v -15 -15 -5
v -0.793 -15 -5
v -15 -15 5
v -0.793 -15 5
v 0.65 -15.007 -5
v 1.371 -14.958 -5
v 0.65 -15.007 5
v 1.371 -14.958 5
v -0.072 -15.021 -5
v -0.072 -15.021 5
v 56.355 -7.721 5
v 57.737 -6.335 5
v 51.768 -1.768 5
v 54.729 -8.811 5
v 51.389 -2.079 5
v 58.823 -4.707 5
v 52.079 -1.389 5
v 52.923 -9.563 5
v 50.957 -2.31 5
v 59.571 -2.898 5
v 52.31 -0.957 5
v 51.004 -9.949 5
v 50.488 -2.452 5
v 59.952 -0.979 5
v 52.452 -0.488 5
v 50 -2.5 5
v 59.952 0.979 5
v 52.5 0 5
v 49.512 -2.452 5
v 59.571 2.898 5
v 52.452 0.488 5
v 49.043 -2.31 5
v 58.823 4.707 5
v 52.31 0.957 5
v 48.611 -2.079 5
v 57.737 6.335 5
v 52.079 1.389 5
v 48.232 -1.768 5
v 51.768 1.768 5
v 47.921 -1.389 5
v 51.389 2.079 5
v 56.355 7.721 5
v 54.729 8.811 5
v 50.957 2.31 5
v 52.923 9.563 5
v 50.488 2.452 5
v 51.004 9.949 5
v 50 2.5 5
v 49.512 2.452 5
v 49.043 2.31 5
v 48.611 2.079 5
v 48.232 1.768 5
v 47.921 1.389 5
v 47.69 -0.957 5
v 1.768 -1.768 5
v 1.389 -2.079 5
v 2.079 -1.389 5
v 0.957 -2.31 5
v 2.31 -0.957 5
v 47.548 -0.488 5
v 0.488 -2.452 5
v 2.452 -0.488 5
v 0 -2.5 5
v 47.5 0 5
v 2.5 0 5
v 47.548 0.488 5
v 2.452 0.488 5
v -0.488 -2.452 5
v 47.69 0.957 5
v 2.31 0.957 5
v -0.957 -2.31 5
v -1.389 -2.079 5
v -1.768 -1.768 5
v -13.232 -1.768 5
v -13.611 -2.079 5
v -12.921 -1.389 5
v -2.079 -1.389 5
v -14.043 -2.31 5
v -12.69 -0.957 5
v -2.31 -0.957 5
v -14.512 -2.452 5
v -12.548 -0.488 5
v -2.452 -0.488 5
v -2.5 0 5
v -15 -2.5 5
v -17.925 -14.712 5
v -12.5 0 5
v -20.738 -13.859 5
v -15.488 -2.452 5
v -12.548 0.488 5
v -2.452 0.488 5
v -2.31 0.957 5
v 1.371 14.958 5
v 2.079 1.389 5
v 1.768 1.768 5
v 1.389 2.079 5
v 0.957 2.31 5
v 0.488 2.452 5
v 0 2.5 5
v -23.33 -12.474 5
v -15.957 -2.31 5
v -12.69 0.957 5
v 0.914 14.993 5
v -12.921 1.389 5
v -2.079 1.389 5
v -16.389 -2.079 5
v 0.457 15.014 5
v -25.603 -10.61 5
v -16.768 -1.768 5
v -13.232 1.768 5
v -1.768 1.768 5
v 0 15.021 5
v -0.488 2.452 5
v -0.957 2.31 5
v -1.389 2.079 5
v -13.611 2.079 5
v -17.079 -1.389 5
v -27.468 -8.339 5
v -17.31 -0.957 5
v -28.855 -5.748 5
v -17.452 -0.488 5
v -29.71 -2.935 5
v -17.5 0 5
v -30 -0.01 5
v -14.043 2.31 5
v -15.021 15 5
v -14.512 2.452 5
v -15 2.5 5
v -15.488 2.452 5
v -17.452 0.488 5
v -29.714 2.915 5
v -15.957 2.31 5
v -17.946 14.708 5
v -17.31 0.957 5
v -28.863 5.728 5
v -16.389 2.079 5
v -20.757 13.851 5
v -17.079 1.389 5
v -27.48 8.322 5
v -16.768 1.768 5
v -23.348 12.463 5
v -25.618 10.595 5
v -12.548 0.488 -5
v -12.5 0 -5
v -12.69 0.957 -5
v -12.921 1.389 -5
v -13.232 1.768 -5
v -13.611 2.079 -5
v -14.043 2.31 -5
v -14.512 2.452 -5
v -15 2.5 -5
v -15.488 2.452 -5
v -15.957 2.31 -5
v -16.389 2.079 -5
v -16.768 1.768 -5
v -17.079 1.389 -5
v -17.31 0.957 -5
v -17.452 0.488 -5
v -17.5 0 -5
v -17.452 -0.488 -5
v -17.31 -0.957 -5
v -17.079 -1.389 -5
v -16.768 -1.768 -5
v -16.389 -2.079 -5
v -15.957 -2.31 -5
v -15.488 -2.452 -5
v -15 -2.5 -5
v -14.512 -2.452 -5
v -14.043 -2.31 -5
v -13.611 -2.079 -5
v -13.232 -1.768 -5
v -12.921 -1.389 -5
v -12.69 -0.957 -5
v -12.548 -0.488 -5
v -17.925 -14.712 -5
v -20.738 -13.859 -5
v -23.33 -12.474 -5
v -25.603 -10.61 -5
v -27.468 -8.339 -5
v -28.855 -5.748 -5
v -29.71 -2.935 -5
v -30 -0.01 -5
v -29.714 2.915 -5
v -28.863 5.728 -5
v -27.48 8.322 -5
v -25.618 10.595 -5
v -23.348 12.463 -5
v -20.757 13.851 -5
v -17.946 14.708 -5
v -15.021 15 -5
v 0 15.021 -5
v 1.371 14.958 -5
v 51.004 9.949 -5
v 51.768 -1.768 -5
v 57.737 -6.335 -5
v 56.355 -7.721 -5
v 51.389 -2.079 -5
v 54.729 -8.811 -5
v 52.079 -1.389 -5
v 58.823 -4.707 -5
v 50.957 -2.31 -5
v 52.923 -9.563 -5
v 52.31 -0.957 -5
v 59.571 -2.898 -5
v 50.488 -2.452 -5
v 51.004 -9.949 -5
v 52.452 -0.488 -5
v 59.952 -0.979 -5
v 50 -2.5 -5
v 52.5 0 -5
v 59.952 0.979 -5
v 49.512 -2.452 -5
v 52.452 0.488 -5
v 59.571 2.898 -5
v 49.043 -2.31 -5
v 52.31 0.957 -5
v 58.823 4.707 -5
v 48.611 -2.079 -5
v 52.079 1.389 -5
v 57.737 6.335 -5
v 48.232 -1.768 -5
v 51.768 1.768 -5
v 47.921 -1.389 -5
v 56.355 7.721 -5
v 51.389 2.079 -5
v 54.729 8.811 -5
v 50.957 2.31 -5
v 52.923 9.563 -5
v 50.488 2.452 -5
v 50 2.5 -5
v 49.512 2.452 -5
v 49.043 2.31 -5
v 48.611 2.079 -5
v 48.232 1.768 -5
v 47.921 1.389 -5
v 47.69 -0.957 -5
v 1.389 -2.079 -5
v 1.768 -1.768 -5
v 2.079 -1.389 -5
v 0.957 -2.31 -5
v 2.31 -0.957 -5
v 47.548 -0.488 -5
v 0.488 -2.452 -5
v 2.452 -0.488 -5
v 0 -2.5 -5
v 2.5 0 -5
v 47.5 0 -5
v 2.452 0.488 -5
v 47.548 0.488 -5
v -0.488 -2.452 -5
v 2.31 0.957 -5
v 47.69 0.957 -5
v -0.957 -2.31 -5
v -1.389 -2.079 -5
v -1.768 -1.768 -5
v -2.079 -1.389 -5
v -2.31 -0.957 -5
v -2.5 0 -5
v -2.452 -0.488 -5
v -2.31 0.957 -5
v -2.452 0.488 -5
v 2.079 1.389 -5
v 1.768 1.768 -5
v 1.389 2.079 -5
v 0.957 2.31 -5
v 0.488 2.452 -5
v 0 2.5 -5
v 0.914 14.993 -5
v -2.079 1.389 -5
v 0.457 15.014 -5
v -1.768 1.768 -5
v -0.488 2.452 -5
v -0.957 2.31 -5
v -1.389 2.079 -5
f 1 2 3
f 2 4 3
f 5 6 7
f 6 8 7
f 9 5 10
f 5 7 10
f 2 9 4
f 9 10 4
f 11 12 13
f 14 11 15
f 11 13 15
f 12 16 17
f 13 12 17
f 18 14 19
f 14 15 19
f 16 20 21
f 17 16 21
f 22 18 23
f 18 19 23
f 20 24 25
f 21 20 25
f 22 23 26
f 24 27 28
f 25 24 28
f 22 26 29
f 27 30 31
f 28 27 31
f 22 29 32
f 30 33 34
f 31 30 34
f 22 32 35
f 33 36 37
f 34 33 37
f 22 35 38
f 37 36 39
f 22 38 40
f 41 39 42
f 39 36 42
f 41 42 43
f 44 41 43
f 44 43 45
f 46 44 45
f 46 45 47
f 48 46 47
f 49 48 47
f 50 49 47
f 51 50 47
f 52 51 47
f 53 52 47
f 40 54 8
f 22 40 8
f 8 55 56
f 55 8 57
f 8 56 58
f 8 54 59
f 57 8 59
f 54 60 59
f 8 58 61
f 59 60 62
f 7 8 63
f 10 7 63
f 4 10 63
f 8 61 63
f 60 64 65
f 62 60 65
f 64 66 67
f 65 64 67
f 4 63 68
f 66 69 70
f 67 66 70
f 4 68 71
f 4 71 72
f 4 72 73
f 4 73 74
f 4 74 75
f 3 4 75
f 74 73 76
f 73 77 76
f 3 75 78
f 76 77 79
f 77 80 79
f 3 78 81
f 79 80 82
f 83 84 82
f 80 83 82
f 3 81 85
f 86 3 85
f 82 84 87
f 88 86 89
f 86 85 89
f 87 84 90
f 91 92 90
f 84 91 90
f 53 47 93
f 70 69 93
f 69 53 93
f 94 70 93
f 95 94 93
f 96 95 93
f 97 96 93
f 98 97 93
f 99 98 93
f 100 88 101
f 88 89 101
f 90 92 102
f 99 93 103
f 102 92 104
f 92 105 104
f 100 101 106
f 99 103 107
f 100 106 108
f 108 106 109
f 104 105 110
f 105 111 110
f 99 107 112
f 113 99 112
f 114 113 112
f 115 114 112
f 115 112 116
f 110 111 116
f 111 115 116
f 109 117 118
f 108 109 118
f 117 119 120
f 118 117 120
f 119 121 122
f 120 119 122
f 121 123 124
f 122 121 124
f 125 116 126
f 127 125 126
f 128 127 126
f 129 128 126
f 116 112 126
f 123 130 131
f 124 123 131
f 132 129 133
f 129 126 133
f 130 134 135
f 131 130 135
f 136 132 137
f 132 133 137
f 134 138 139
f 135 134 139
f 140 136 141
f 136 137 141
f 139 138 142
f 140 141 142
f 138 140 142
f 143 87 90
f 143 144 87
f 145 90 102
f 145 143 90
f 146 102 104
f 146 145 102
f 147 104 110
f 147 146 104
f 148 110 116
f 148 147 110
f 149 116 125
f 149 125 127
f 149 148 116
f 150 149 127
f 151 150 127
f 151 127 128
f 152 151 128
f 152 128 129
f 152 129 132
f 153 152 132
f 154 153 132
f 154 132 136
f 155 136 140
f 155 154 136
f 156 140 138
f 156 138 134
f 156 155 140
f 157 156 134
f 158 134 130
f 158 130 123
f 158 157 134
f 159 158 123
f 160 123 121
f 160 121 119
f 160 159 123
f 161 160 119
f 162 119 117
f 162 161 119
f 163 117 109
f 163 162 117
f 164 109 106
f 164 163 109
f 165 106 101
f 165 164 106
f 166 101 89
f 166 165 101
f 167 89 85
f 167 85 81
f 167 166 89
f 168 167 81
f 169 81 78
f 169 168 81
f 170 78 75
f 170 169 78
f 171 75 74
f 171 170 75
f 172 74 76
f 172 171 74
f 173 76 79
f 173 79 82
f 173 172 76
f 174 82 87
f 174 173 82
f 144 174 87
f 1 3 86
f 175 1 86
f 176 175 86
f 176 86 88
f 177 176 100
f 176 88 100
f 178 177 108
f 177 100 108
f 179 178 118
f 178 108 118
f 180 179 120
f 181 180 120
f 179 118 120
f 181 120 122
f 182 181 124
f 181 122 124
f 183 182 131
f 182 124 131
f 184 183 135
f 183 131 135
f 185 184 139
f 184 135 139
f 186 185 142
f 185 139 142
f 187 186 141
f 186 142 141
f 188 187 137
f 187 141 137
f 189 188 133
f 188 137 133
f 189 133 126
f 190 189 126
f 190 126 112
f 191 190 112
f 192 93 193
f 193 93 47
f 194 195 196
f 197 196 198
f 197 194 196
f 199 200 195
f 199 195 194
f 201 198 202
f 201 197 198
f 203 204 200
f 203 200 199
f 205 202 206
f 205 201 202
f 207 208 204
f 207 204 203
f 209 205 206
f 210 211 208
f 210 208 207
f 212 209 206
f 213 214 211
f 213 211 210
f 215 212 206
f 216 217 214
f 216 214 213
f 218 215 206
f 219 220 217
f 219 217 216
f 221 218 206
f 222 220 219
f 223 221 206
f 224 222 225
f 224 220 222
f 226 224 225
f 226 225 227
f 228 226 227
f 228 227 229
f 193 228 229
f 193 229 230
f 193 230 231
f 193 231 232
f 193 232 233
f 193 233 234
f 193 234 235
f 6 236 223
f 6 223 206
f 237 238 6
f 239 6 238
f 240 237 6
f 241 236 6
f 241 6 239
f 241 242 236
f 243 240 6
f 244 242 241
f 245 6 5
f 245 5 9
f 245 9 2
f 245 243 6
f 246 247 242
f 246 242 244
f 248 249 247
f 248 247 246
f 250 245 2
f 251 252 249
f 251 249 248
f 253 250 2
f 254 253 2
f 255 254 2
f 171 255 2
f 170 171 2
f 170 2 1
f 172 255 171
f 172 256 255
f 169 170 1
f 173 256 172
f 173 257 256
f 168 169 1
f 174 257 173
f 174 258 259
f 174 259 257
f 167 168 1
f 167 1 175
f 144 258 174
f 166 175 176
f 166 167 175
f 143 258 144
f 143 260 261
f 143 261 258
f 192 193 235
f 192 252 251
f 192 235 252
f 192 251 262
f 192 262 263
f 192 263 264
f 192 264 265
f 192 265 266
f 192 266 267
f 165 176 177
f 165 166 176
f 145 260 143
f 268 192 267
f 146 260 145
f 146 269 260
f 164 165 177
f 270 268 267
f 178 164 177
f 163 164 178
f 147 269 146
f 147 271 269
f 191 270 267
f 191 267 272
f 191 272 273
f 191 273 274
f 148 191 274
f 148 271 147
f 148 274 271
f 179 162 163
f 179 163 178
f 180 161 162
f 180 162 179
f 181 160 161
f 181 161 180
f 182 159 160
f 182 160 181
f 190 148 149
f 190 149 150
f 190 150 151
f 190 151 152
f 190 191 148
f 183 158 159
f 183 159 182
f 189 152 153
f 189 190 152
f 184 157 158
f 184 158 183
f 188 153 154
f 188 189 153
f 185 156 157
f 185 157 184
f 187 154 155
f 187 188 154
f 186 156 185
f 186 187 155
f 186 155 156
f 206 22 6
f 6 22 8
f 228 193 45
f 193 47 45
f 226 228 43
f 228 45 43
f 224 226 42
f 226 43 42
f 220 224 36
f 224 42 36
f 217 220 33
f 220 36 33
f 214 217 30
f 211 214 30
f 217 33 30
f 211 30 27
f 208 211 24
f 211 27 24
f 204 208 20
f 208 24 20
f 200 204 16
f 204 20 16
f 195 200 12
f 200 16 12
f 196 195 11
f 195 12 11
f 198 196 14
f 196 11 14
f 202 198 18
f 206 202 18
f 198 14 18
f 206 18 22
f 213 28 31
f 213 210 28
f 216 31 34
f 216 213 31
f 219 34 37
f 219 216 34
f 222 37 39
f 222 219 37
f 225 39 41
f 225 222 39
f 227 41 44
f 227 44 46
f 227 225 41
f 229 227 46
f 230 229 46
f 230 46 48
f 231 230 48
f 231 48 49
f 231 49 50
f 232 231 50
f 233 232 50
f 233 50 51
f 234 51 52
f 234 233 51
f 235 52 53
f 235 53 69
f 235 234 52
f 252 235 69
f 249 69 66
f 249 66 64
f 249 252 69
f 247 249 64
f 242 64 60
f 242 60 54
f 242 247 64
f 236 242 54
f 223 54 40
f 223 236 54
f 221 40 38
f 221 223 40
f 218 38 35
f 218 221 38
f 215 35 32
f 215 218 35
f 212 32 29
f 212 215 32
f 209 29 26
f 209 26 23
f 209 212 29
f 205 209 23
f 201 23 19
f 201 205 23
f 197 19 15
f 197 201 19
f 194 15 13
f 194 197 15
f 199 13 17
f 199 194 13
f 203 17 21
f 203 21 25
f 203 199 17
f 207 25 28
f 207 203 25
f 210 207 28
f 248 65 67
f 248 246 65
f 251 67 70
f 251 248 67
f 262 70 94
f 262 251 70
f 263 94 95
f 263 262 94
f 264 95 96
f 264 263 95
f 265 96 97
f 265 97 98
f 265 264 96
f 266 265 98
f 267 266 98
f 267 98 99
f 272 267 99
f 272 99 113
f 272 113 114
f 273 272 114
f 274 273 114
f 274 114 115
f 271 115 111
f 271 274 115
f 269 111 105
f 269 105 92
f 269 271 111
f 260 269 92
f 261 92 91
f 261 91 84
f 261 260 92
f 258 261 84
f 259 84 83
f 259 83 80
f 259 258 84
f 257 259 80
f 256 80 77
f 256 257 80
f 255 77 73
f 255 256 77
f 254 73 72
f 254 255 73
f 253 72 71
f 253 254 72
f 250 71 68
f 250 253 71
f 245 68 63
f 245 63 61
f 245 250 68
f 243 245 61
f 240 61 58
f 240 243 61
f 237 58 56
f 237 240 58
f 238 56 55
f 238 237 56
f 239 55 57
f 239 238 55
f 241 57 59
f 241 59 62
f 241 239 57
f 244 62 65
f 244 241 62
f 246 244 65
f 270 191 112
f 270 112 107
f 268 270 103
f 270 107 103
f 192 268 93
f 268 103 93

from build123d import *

# Parameters (mm, degrees)
SKETCH1_R           = 2.5
BOSS_EXTRUDE1_DEPTH = 5


with BuildPart() as part:
    # Sketch1 → Boss-Extrude1 (new, symmetric)
    with BuildSketch(Plane.XY):
        with BuildLine():
            Line((1.370602209, 14.9582984), (51.004064798, 9.949465005))
            ThreePointArc((51.004064798, 9.949465005), (60, 0), (51.004064798, -9.949465005))
            Line((51.004064798, -9.949465005), (1.370602209, -14.9582984))
            ThreePointArc((1.370602209, -14.9582984), (0.289429434, -15.018171395), (-0.793247409, -15))
            Line((-0.793247409, -15), (-15, -15))
            ThreePointArc((-15, -15), (-29.999996344, -0.010472716), (-15.020945427, 14.999985376))
            Line((-15.020945427, 14.999985376), (0, 15.020960071))
            ThreePointArc((0, 15.020960071), (0.686016928, 15.005286476), (1.370602209, 14.9582984))
        make_face()
        with Locations((-15, 0)):
            Circle(SKETCH1_R, mode=Mode.SUBTRACT)
        Circle(SKETCH1_R, mode=Mode.SUBTRACT)
        with Locations((50, 0)):
            Circle(SKETCH1_R, mode=Mode.SUBTRACT)
    extrude(amount=BOSS_EXTRUDE1_DEPTH, both=True)


solid = part.part
